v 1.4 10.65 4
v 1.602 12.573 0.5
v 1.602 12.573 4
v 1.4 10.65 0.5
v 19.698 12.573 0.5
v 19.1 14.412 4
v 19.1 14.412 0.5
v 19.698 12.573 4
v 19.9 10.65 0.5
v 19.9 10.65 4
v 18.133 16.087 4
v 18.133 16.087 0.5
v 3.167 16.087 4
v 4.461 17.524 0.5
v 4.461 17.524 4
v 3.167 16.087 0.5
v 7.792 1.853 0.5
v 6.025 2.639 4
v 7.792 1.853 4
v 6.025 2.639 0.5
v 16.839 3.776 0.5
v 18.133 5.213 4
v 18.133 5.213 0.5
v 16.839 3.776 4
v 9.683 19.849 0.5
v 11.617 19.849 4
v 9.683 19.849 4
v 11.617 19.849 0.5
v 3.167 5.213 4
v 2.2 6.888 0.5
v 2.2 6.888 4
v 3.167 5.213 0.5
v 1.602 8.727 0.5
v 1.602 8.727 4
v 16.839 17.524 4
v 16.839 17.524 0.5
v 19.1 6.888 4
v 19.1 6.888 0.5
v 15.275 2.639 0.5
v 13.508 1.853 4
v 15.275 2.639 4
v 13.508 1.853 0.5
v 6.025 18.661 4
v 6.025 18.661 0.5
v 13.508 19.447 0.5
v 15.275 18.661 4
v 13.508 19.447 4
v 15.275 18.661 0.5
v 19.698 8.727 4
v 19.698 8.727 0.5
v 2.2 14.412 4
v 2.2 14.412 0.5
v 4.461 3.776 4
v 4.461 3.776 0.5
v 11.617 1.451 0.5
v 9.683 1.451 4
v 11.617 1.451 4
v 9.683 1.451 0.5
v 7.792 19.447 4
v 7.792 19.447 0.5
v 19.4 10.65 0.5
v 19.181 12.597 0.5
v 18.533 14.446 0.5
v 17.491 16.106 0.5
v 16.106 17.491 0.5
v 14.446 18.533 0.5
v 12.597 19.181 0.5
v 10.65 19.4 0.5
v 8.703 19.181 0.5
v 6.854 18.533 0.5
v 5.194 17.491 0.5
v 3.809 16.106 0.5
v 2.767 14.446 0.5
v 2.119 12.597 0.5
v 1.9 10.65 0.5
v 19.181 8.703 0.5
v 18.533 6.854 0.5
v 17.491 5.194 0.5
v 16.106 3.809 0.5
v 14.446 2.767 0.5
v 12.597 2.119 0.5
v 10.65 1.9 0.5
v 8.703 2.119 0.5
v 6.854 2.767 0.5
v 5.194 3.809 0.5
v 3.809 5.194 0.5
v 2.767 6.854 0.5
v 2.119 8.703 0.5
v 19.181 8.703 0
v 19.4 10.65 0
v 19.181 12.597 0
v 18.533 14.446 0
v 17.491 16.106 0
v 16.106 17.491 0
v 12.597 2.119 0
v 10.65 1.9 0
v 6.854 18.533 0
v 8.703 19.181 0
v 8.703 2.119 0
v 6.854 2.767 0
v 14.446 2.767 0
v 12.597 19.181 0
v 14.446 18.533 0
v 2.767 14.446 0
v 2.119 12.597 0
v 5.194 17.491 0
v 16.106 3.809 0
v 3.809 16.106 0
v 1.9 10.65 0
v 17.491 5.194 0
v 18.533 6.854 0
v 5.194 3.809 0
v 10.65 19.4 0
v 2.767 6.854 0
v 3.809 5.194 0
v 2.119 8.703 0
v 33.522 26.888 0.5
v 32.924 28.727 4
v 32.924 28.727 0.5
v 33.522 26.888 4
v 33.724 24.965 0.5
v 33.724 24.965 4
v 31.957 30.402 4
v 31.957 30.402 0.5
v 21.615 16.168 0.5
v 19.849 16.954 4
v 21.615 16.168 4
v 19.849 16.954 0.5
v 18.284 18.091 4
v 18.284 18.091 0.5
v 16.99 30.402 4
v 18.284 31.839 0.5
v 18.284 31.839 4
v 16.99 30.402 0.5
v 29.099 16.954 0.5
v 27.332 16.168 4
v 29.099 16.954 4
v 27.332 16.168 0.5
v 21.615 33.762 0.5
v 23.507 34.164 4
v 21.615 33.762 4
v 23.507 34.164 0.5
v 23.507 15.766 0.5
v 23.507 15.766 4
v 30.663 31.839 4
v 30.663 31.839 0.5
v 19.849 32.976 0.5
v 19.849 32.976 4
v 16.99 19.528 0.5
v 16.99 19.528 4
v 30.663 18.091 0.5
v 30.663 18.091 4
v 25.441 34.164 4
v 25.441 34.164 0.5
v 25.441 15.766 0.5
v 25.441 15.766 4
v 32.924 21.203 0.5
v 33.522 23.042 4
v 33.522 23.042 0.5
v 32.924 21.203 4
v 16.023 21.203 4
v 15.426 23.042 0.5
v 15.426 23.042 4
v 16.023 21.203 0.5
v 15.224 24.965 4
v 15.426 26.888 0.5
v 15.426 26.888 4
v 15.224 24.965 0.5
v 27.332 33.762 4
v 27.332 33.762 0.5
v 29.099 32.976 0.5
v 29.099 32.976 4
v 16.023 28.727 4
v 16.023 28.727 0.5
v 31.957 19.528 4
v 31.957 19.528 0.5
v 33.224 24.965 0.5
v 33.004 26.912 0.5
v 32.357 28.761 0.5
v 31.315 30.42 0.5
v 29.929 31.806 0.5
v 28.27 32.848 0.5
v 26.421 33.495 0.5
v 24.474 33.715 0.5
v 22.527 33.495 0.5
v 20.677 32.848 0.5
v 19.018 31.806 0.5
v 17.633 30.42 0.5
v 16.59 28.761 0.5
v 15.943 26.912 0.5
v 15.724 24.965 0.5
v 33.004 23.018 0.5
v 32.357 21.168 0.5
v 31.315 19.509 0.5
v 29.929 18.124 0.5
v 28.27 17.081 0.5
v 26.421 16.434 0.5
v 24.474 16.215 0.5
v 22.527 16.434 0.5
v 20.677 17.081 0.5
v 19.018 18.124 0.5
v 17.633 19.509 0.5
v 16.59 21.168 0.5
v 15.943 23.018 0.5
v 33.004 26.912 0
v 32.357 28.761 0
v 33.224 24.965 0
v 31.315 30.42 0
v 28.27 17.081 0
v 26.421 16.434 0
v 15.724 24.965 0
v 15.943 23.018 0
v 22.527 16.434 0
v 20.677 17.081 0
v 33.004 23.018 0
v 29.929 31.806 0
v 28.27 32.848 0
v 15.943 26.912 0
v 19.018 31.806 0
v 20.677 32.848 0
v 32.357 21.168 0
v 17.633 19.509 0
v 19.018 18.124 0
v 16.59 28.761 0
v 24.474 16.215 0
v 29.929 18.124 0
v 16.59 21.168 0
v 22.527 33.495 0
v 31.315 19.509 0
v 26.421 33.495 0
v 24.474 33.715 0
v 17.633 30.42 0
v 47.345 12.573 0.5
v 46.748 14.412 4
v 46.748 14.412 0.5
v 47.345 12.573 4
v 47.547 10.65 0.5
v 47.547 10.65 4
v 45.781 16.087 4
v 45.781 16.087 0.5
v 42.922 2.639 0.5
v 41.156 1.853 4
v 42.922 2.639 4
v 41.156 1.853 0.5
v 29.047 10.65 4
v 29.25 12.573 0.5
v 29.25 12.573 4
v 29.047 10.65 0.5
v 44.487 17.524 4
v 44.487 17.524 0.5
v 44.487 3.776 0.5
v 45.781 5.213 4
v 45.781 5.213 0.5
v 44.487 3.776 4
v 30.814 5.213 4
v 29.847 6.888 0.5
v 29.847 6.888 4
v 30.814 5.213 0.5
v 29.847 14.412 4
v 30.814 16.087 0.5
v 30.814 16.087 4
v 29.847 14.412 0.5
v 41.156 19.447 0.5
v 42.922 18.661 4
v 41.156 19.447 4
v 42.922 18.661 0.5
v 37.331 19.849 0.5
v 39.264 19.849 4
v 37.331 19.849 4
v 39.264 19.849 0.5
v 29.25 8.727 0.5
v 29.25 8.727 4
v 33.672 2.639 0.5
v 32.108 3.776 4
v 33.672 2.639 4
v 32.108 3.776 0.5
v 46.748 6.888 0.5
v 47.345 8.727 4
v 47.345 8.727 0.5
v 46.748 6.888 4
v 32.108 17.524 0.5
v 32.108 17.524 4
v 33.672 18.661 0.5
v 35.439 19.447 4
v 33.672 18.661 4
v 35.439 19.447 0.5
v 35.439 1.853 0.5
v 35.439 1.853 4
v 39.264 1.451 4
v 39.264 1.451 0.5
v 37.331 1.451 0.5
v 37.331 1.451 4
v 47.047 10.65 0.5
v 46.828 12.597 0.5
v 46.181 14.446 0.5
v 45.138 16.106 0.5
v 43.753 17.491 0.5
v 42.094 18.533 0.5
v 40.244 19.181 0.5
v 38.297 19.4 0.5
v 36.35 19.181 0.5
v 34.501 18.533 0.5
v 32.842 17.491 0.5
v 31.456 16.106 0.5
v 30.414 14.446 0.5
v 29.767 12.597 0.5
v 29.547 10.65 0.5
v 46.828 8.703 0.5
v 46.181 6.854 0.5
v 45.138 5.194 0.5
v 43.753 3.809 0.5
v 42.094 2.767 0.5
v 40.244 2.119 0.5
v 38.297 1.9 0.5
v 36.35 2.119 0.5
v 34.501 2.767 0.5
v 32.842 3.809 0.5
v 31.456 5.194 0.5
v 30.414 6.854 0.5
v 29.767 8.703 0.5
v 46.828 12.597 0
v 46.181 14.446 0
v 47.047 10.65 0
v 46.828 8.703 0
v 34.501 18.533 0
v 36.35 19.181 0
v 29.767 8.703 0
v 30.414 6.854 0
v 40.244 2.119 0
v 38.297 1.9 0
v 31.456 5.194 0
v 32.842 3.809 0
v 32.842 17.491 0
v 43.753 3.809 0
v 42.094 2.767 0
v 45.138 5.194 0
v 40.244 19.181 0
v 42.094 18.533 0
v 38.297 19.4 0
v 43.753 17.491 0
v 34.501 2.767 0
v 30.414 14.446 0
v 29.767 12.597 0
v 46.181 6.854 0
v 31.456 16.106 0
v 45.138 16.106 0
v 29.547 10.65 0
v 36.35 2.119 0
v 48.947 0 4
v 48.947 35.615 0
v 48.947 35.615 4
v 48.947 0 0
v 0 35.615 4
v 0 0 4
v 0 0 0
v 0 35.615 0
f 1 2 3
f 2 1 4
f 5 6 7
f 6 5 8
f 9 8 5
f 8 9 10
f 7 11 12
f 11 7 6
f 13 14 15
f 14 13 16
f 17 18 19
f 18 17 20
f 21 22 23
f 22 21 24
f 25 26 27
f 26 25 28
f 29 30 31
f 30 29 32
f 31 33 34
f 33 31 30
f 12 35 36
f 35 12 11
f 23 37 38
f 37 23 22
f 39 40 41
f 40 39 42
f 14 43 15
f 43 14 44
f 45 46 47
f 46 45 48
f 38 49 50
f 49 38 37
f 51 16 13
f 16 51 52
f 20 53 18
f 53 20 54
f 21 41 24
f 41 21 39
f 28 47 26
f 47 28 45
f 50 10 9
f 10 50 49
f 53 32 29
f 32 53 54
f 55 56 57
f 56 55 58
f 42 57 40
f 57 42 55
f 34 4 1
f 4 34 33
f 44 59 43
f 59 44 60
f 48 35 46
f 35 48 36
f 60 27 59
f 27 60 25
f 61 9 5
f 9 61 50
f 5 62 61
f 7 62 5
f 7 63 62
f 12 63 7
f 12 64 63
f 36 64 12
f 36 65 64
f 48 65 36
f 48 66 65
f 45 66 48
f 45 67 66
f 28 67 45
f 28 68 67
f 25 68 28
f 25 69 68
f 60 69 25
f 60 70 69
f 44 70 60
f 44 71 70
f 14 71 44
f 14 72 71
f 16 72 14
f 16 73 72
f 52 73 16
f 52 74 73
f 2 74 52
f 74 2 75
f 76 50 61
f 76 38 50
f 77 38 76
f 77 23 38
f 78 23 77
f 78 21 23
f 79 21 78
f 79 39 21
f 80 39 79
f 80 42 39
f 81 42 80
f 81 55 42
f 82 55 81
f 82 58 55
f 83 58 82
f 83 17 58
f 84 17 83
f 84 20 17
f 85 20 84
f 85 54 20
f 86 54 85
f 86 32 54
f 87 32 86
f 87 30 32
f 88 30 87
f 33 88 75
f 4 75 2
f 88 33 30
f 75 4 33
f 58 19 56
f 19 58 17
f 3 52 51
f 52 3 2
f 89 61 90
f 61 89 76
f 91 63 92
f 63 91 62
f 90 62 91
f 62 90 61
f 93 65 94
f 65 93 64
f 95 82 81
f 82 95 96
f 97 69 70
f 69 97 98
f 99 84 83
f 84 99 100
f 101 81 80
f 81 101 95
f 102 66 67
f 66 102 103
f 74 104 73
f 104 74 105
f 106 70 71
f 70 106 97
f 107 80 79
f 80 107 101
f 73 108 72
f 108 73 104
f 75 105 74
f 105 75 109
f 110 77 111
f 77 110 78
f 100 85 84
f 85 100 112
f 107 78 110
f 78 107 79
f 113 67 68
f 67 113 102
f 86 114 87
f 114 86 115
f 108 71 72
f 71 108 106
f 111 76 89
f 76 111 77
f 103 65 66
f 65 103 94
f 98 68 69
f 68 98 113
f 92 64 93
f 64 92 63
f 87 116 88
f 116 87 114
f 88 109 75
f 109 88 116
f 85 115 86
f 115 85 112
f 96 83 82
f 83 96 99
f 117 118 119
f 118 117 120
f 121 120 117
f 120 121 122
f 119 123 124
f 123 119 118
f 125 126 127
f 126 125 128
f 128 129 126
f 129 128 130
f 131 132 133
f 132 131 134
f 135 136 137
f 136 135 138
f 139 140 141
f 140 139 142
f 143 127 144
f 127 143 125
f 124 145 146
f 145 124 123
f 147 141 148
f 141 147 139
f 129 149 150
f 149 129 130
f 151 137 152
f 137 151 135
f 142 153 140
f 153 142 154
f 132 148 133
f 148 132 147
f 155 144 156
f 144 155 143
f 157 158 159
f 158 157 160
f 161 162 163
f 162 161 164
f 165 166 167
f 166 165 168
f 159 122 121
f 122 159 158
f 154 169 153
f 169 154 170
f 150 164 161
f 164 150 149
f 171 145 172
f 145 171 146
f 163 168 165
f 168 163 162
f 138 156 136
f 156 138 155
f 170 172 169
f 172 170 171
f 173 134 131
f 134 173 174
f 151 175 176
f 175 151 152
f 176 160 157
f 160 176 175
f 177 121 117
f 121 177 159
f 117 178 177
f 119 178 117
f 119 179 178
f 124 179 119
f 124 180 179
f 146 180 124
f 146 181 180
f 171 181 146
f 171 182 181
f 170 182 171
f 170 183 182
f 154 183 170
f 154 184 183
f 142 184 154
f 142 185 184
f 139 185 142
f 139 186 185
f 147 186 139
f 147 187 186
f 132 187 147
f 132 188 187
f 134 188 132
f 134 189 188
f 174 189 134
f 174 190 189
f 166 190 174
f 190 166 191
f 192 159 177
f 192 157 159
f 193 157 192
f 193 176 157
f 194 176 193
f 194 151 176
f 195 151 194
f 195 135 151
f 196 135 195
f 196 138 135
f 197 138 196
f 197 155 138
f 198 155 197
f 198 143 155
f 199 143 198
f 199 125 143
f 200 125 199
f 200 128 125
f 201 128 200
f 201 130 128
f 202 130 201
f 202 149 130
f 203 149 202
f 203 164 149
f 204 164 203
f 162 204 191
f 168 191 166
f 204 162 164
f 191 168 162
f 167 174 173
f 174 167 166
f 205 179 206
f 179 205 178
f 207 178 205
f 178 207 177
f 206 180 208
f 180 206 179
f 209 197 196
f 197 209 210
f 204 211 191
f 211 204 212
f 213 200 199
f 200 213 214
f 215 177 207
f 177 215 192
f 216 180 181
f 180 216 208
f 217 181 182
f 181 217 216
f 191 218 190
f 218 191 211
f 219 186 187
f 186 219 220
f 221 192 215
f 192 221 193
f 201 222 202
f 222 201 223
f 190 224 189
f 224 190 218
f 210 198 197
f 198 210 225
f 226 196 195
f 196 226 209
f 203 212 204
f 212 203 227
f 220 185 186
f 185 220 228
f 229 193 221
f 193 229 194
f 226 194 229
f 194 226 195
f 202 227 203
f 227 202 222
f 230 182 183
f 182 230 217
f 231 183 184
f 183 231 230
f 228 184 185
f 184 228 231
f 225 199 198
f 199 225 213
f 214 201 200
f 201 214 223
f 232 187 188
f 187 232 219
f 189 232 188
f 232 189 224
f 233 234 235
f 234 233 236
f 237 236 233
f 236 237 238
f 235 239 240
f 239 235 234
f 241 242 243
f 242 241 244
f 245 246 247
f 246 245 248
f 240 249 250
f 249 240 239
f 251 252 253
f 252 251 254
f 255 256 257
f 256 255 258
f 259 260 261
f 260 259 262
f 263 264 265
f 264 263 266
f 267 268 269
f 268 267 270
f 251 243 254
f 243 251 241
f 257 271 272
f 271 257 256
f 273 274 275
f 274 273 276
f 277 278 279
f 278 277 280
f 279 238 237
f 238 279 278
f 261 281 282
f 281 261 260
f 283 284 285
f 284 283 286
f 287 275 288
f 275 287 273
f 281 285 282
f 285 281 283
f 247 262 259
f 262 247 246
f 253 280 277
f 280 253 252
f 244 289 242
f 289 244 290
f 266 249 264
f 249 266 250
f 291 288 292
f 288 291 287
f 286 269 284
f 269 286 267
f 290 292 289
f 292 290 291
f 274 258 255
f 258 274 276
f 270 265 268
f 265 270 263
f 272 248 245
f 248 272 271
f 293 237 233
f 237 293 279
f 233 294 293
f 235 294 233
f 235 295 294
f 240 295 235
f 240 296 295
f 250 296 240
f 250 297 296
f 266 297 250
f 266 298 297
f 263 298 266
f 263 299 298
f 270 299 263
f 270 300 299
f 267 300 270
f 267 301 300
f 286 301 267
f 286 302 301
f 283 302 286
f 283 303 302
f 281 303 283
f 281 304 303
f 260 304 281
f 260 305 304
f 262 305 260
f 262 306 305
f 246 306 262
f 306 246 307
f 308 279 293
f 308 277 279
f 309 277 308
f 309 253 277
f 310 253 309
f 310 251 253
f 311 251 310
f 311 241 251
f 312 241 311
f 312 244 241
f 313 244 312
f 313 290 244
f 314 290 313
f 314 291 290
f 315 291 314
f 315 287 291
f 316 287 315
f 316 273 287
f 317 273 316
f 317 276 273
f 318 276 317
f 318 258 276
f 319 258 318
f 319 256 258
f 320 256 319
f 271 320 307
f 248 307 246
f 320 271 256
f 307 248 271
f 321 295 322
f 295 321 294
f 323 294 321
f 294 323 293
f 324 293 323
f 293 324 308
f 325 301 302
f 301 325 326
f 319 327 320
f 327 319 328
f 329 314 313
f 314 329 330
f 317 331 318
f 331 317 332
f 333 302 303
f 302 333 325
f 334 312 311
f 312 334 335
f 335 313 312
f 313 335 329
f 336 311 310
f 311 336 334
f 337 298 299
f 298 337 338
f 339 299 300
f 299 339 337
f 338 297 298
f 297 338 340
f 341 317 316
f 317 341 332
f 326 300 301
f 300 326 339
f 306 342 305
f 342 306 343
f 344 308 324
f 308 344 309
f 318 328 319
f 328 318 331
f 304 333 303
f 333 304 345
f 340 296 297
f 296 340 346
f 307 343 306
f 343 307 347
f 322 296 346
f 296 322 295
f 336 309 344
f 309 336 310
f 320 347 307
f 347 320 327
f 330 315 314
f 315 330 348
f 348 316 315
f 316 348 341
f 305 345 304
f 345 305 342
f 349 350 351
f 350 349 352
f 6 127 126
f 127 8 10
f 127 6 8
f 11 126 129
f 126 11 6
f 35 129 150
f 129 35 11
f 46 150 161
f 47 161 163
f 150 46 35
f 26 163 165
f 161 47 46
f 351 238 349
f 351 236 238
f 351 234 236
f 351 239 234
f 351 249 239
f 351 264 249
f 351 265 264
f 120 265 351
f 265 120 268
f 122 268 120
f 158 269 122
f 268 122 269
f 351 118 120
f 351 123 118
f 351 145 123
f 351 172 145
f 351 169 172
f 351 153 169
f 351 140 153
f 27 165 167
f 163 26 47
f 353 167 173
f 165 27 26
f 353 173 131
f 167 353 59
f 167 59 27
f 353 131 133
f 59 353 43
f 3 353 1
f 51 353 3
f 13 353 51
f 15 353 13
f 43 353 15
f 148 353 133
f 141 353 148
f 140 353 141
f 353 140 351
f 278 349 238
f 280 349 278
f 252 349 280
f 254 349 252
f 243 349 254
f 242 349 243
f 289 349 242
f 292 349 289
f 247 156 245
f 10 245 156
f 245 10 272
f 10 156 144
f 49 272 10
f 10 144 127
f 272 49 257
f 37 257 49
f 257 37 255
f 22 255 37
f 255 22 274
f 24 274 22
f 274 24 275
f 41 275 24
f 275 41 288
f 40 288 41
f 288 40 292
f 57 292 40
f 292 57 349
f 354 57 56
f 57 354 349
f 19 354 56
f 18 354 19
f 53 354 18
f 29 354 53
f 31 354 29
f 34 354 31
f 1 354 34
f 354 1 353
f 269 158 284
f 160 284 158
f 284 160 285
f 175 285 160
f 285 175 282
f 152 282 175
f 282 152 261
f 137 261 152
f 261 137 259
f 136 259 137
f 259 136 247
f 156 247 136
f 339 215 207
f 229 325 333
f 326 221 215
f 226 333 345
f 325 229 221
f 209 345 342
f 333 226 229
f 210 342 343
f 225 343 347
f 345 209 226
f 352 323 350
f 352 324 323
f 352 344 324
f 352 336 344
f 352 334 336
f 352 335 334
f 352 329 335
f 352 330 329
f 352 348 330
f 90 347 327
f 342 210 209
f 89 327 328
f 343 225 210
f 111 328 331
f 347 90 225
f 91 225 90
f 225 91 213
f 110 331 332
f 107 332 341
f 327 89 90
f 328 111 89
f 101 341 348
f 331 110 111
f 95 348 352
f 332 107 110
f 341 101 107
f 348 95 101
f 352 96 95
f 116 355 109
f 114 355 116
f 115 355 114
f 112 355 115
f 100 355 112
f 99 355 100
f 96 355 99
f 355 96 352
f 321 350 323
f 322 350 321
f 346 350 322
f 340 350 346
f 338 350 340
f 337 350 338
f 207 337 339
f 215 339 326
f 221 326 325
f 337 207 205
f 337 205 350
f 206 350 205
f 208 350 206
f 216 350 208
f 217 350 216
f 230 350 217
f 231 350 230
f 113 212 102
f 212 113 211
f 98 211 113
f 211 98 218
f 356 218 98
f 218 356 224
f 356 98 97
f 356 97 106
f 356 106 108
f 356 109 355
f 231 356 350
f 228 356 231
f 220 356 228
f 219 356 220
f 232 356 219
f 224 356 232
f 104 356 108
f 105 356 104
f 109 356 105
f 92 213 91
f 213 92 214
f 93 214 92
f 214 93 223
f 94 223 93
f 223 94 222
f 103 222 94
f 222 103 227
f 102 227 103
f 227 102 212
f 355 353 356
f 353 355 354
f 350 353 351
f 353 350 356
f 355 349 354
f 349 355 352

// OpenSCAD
n_cells = 3;
d = 18.5;
gap = 1.4;
angle = 44 ;
lip = .5;
e = .01;

start = [d/2 + gap, d/2 + gap];
step_x = (d + gap)*sin(angle);
step_y = (d + gap)*cos(angle);
rect = [ start[0]*2 + (n_cells-1)*step_x, start[1]*2+step_y, 4 ];

echo(rect);

difference(){
    cube( rect );
    for( i = [0:n_cells-1] ) bat(start + [ step_x * i, step_y*(i%2)]);
}

module bat(xy){
    union(){
        translate( [xy[0], xy[1], lip]) 
            cylinder ( 5, d/2, d/2 );
        translate( [xy[0], xy[1], -e]) 
            cylinder ( 5, d/2-lip, d/2-lip );
    }
}
